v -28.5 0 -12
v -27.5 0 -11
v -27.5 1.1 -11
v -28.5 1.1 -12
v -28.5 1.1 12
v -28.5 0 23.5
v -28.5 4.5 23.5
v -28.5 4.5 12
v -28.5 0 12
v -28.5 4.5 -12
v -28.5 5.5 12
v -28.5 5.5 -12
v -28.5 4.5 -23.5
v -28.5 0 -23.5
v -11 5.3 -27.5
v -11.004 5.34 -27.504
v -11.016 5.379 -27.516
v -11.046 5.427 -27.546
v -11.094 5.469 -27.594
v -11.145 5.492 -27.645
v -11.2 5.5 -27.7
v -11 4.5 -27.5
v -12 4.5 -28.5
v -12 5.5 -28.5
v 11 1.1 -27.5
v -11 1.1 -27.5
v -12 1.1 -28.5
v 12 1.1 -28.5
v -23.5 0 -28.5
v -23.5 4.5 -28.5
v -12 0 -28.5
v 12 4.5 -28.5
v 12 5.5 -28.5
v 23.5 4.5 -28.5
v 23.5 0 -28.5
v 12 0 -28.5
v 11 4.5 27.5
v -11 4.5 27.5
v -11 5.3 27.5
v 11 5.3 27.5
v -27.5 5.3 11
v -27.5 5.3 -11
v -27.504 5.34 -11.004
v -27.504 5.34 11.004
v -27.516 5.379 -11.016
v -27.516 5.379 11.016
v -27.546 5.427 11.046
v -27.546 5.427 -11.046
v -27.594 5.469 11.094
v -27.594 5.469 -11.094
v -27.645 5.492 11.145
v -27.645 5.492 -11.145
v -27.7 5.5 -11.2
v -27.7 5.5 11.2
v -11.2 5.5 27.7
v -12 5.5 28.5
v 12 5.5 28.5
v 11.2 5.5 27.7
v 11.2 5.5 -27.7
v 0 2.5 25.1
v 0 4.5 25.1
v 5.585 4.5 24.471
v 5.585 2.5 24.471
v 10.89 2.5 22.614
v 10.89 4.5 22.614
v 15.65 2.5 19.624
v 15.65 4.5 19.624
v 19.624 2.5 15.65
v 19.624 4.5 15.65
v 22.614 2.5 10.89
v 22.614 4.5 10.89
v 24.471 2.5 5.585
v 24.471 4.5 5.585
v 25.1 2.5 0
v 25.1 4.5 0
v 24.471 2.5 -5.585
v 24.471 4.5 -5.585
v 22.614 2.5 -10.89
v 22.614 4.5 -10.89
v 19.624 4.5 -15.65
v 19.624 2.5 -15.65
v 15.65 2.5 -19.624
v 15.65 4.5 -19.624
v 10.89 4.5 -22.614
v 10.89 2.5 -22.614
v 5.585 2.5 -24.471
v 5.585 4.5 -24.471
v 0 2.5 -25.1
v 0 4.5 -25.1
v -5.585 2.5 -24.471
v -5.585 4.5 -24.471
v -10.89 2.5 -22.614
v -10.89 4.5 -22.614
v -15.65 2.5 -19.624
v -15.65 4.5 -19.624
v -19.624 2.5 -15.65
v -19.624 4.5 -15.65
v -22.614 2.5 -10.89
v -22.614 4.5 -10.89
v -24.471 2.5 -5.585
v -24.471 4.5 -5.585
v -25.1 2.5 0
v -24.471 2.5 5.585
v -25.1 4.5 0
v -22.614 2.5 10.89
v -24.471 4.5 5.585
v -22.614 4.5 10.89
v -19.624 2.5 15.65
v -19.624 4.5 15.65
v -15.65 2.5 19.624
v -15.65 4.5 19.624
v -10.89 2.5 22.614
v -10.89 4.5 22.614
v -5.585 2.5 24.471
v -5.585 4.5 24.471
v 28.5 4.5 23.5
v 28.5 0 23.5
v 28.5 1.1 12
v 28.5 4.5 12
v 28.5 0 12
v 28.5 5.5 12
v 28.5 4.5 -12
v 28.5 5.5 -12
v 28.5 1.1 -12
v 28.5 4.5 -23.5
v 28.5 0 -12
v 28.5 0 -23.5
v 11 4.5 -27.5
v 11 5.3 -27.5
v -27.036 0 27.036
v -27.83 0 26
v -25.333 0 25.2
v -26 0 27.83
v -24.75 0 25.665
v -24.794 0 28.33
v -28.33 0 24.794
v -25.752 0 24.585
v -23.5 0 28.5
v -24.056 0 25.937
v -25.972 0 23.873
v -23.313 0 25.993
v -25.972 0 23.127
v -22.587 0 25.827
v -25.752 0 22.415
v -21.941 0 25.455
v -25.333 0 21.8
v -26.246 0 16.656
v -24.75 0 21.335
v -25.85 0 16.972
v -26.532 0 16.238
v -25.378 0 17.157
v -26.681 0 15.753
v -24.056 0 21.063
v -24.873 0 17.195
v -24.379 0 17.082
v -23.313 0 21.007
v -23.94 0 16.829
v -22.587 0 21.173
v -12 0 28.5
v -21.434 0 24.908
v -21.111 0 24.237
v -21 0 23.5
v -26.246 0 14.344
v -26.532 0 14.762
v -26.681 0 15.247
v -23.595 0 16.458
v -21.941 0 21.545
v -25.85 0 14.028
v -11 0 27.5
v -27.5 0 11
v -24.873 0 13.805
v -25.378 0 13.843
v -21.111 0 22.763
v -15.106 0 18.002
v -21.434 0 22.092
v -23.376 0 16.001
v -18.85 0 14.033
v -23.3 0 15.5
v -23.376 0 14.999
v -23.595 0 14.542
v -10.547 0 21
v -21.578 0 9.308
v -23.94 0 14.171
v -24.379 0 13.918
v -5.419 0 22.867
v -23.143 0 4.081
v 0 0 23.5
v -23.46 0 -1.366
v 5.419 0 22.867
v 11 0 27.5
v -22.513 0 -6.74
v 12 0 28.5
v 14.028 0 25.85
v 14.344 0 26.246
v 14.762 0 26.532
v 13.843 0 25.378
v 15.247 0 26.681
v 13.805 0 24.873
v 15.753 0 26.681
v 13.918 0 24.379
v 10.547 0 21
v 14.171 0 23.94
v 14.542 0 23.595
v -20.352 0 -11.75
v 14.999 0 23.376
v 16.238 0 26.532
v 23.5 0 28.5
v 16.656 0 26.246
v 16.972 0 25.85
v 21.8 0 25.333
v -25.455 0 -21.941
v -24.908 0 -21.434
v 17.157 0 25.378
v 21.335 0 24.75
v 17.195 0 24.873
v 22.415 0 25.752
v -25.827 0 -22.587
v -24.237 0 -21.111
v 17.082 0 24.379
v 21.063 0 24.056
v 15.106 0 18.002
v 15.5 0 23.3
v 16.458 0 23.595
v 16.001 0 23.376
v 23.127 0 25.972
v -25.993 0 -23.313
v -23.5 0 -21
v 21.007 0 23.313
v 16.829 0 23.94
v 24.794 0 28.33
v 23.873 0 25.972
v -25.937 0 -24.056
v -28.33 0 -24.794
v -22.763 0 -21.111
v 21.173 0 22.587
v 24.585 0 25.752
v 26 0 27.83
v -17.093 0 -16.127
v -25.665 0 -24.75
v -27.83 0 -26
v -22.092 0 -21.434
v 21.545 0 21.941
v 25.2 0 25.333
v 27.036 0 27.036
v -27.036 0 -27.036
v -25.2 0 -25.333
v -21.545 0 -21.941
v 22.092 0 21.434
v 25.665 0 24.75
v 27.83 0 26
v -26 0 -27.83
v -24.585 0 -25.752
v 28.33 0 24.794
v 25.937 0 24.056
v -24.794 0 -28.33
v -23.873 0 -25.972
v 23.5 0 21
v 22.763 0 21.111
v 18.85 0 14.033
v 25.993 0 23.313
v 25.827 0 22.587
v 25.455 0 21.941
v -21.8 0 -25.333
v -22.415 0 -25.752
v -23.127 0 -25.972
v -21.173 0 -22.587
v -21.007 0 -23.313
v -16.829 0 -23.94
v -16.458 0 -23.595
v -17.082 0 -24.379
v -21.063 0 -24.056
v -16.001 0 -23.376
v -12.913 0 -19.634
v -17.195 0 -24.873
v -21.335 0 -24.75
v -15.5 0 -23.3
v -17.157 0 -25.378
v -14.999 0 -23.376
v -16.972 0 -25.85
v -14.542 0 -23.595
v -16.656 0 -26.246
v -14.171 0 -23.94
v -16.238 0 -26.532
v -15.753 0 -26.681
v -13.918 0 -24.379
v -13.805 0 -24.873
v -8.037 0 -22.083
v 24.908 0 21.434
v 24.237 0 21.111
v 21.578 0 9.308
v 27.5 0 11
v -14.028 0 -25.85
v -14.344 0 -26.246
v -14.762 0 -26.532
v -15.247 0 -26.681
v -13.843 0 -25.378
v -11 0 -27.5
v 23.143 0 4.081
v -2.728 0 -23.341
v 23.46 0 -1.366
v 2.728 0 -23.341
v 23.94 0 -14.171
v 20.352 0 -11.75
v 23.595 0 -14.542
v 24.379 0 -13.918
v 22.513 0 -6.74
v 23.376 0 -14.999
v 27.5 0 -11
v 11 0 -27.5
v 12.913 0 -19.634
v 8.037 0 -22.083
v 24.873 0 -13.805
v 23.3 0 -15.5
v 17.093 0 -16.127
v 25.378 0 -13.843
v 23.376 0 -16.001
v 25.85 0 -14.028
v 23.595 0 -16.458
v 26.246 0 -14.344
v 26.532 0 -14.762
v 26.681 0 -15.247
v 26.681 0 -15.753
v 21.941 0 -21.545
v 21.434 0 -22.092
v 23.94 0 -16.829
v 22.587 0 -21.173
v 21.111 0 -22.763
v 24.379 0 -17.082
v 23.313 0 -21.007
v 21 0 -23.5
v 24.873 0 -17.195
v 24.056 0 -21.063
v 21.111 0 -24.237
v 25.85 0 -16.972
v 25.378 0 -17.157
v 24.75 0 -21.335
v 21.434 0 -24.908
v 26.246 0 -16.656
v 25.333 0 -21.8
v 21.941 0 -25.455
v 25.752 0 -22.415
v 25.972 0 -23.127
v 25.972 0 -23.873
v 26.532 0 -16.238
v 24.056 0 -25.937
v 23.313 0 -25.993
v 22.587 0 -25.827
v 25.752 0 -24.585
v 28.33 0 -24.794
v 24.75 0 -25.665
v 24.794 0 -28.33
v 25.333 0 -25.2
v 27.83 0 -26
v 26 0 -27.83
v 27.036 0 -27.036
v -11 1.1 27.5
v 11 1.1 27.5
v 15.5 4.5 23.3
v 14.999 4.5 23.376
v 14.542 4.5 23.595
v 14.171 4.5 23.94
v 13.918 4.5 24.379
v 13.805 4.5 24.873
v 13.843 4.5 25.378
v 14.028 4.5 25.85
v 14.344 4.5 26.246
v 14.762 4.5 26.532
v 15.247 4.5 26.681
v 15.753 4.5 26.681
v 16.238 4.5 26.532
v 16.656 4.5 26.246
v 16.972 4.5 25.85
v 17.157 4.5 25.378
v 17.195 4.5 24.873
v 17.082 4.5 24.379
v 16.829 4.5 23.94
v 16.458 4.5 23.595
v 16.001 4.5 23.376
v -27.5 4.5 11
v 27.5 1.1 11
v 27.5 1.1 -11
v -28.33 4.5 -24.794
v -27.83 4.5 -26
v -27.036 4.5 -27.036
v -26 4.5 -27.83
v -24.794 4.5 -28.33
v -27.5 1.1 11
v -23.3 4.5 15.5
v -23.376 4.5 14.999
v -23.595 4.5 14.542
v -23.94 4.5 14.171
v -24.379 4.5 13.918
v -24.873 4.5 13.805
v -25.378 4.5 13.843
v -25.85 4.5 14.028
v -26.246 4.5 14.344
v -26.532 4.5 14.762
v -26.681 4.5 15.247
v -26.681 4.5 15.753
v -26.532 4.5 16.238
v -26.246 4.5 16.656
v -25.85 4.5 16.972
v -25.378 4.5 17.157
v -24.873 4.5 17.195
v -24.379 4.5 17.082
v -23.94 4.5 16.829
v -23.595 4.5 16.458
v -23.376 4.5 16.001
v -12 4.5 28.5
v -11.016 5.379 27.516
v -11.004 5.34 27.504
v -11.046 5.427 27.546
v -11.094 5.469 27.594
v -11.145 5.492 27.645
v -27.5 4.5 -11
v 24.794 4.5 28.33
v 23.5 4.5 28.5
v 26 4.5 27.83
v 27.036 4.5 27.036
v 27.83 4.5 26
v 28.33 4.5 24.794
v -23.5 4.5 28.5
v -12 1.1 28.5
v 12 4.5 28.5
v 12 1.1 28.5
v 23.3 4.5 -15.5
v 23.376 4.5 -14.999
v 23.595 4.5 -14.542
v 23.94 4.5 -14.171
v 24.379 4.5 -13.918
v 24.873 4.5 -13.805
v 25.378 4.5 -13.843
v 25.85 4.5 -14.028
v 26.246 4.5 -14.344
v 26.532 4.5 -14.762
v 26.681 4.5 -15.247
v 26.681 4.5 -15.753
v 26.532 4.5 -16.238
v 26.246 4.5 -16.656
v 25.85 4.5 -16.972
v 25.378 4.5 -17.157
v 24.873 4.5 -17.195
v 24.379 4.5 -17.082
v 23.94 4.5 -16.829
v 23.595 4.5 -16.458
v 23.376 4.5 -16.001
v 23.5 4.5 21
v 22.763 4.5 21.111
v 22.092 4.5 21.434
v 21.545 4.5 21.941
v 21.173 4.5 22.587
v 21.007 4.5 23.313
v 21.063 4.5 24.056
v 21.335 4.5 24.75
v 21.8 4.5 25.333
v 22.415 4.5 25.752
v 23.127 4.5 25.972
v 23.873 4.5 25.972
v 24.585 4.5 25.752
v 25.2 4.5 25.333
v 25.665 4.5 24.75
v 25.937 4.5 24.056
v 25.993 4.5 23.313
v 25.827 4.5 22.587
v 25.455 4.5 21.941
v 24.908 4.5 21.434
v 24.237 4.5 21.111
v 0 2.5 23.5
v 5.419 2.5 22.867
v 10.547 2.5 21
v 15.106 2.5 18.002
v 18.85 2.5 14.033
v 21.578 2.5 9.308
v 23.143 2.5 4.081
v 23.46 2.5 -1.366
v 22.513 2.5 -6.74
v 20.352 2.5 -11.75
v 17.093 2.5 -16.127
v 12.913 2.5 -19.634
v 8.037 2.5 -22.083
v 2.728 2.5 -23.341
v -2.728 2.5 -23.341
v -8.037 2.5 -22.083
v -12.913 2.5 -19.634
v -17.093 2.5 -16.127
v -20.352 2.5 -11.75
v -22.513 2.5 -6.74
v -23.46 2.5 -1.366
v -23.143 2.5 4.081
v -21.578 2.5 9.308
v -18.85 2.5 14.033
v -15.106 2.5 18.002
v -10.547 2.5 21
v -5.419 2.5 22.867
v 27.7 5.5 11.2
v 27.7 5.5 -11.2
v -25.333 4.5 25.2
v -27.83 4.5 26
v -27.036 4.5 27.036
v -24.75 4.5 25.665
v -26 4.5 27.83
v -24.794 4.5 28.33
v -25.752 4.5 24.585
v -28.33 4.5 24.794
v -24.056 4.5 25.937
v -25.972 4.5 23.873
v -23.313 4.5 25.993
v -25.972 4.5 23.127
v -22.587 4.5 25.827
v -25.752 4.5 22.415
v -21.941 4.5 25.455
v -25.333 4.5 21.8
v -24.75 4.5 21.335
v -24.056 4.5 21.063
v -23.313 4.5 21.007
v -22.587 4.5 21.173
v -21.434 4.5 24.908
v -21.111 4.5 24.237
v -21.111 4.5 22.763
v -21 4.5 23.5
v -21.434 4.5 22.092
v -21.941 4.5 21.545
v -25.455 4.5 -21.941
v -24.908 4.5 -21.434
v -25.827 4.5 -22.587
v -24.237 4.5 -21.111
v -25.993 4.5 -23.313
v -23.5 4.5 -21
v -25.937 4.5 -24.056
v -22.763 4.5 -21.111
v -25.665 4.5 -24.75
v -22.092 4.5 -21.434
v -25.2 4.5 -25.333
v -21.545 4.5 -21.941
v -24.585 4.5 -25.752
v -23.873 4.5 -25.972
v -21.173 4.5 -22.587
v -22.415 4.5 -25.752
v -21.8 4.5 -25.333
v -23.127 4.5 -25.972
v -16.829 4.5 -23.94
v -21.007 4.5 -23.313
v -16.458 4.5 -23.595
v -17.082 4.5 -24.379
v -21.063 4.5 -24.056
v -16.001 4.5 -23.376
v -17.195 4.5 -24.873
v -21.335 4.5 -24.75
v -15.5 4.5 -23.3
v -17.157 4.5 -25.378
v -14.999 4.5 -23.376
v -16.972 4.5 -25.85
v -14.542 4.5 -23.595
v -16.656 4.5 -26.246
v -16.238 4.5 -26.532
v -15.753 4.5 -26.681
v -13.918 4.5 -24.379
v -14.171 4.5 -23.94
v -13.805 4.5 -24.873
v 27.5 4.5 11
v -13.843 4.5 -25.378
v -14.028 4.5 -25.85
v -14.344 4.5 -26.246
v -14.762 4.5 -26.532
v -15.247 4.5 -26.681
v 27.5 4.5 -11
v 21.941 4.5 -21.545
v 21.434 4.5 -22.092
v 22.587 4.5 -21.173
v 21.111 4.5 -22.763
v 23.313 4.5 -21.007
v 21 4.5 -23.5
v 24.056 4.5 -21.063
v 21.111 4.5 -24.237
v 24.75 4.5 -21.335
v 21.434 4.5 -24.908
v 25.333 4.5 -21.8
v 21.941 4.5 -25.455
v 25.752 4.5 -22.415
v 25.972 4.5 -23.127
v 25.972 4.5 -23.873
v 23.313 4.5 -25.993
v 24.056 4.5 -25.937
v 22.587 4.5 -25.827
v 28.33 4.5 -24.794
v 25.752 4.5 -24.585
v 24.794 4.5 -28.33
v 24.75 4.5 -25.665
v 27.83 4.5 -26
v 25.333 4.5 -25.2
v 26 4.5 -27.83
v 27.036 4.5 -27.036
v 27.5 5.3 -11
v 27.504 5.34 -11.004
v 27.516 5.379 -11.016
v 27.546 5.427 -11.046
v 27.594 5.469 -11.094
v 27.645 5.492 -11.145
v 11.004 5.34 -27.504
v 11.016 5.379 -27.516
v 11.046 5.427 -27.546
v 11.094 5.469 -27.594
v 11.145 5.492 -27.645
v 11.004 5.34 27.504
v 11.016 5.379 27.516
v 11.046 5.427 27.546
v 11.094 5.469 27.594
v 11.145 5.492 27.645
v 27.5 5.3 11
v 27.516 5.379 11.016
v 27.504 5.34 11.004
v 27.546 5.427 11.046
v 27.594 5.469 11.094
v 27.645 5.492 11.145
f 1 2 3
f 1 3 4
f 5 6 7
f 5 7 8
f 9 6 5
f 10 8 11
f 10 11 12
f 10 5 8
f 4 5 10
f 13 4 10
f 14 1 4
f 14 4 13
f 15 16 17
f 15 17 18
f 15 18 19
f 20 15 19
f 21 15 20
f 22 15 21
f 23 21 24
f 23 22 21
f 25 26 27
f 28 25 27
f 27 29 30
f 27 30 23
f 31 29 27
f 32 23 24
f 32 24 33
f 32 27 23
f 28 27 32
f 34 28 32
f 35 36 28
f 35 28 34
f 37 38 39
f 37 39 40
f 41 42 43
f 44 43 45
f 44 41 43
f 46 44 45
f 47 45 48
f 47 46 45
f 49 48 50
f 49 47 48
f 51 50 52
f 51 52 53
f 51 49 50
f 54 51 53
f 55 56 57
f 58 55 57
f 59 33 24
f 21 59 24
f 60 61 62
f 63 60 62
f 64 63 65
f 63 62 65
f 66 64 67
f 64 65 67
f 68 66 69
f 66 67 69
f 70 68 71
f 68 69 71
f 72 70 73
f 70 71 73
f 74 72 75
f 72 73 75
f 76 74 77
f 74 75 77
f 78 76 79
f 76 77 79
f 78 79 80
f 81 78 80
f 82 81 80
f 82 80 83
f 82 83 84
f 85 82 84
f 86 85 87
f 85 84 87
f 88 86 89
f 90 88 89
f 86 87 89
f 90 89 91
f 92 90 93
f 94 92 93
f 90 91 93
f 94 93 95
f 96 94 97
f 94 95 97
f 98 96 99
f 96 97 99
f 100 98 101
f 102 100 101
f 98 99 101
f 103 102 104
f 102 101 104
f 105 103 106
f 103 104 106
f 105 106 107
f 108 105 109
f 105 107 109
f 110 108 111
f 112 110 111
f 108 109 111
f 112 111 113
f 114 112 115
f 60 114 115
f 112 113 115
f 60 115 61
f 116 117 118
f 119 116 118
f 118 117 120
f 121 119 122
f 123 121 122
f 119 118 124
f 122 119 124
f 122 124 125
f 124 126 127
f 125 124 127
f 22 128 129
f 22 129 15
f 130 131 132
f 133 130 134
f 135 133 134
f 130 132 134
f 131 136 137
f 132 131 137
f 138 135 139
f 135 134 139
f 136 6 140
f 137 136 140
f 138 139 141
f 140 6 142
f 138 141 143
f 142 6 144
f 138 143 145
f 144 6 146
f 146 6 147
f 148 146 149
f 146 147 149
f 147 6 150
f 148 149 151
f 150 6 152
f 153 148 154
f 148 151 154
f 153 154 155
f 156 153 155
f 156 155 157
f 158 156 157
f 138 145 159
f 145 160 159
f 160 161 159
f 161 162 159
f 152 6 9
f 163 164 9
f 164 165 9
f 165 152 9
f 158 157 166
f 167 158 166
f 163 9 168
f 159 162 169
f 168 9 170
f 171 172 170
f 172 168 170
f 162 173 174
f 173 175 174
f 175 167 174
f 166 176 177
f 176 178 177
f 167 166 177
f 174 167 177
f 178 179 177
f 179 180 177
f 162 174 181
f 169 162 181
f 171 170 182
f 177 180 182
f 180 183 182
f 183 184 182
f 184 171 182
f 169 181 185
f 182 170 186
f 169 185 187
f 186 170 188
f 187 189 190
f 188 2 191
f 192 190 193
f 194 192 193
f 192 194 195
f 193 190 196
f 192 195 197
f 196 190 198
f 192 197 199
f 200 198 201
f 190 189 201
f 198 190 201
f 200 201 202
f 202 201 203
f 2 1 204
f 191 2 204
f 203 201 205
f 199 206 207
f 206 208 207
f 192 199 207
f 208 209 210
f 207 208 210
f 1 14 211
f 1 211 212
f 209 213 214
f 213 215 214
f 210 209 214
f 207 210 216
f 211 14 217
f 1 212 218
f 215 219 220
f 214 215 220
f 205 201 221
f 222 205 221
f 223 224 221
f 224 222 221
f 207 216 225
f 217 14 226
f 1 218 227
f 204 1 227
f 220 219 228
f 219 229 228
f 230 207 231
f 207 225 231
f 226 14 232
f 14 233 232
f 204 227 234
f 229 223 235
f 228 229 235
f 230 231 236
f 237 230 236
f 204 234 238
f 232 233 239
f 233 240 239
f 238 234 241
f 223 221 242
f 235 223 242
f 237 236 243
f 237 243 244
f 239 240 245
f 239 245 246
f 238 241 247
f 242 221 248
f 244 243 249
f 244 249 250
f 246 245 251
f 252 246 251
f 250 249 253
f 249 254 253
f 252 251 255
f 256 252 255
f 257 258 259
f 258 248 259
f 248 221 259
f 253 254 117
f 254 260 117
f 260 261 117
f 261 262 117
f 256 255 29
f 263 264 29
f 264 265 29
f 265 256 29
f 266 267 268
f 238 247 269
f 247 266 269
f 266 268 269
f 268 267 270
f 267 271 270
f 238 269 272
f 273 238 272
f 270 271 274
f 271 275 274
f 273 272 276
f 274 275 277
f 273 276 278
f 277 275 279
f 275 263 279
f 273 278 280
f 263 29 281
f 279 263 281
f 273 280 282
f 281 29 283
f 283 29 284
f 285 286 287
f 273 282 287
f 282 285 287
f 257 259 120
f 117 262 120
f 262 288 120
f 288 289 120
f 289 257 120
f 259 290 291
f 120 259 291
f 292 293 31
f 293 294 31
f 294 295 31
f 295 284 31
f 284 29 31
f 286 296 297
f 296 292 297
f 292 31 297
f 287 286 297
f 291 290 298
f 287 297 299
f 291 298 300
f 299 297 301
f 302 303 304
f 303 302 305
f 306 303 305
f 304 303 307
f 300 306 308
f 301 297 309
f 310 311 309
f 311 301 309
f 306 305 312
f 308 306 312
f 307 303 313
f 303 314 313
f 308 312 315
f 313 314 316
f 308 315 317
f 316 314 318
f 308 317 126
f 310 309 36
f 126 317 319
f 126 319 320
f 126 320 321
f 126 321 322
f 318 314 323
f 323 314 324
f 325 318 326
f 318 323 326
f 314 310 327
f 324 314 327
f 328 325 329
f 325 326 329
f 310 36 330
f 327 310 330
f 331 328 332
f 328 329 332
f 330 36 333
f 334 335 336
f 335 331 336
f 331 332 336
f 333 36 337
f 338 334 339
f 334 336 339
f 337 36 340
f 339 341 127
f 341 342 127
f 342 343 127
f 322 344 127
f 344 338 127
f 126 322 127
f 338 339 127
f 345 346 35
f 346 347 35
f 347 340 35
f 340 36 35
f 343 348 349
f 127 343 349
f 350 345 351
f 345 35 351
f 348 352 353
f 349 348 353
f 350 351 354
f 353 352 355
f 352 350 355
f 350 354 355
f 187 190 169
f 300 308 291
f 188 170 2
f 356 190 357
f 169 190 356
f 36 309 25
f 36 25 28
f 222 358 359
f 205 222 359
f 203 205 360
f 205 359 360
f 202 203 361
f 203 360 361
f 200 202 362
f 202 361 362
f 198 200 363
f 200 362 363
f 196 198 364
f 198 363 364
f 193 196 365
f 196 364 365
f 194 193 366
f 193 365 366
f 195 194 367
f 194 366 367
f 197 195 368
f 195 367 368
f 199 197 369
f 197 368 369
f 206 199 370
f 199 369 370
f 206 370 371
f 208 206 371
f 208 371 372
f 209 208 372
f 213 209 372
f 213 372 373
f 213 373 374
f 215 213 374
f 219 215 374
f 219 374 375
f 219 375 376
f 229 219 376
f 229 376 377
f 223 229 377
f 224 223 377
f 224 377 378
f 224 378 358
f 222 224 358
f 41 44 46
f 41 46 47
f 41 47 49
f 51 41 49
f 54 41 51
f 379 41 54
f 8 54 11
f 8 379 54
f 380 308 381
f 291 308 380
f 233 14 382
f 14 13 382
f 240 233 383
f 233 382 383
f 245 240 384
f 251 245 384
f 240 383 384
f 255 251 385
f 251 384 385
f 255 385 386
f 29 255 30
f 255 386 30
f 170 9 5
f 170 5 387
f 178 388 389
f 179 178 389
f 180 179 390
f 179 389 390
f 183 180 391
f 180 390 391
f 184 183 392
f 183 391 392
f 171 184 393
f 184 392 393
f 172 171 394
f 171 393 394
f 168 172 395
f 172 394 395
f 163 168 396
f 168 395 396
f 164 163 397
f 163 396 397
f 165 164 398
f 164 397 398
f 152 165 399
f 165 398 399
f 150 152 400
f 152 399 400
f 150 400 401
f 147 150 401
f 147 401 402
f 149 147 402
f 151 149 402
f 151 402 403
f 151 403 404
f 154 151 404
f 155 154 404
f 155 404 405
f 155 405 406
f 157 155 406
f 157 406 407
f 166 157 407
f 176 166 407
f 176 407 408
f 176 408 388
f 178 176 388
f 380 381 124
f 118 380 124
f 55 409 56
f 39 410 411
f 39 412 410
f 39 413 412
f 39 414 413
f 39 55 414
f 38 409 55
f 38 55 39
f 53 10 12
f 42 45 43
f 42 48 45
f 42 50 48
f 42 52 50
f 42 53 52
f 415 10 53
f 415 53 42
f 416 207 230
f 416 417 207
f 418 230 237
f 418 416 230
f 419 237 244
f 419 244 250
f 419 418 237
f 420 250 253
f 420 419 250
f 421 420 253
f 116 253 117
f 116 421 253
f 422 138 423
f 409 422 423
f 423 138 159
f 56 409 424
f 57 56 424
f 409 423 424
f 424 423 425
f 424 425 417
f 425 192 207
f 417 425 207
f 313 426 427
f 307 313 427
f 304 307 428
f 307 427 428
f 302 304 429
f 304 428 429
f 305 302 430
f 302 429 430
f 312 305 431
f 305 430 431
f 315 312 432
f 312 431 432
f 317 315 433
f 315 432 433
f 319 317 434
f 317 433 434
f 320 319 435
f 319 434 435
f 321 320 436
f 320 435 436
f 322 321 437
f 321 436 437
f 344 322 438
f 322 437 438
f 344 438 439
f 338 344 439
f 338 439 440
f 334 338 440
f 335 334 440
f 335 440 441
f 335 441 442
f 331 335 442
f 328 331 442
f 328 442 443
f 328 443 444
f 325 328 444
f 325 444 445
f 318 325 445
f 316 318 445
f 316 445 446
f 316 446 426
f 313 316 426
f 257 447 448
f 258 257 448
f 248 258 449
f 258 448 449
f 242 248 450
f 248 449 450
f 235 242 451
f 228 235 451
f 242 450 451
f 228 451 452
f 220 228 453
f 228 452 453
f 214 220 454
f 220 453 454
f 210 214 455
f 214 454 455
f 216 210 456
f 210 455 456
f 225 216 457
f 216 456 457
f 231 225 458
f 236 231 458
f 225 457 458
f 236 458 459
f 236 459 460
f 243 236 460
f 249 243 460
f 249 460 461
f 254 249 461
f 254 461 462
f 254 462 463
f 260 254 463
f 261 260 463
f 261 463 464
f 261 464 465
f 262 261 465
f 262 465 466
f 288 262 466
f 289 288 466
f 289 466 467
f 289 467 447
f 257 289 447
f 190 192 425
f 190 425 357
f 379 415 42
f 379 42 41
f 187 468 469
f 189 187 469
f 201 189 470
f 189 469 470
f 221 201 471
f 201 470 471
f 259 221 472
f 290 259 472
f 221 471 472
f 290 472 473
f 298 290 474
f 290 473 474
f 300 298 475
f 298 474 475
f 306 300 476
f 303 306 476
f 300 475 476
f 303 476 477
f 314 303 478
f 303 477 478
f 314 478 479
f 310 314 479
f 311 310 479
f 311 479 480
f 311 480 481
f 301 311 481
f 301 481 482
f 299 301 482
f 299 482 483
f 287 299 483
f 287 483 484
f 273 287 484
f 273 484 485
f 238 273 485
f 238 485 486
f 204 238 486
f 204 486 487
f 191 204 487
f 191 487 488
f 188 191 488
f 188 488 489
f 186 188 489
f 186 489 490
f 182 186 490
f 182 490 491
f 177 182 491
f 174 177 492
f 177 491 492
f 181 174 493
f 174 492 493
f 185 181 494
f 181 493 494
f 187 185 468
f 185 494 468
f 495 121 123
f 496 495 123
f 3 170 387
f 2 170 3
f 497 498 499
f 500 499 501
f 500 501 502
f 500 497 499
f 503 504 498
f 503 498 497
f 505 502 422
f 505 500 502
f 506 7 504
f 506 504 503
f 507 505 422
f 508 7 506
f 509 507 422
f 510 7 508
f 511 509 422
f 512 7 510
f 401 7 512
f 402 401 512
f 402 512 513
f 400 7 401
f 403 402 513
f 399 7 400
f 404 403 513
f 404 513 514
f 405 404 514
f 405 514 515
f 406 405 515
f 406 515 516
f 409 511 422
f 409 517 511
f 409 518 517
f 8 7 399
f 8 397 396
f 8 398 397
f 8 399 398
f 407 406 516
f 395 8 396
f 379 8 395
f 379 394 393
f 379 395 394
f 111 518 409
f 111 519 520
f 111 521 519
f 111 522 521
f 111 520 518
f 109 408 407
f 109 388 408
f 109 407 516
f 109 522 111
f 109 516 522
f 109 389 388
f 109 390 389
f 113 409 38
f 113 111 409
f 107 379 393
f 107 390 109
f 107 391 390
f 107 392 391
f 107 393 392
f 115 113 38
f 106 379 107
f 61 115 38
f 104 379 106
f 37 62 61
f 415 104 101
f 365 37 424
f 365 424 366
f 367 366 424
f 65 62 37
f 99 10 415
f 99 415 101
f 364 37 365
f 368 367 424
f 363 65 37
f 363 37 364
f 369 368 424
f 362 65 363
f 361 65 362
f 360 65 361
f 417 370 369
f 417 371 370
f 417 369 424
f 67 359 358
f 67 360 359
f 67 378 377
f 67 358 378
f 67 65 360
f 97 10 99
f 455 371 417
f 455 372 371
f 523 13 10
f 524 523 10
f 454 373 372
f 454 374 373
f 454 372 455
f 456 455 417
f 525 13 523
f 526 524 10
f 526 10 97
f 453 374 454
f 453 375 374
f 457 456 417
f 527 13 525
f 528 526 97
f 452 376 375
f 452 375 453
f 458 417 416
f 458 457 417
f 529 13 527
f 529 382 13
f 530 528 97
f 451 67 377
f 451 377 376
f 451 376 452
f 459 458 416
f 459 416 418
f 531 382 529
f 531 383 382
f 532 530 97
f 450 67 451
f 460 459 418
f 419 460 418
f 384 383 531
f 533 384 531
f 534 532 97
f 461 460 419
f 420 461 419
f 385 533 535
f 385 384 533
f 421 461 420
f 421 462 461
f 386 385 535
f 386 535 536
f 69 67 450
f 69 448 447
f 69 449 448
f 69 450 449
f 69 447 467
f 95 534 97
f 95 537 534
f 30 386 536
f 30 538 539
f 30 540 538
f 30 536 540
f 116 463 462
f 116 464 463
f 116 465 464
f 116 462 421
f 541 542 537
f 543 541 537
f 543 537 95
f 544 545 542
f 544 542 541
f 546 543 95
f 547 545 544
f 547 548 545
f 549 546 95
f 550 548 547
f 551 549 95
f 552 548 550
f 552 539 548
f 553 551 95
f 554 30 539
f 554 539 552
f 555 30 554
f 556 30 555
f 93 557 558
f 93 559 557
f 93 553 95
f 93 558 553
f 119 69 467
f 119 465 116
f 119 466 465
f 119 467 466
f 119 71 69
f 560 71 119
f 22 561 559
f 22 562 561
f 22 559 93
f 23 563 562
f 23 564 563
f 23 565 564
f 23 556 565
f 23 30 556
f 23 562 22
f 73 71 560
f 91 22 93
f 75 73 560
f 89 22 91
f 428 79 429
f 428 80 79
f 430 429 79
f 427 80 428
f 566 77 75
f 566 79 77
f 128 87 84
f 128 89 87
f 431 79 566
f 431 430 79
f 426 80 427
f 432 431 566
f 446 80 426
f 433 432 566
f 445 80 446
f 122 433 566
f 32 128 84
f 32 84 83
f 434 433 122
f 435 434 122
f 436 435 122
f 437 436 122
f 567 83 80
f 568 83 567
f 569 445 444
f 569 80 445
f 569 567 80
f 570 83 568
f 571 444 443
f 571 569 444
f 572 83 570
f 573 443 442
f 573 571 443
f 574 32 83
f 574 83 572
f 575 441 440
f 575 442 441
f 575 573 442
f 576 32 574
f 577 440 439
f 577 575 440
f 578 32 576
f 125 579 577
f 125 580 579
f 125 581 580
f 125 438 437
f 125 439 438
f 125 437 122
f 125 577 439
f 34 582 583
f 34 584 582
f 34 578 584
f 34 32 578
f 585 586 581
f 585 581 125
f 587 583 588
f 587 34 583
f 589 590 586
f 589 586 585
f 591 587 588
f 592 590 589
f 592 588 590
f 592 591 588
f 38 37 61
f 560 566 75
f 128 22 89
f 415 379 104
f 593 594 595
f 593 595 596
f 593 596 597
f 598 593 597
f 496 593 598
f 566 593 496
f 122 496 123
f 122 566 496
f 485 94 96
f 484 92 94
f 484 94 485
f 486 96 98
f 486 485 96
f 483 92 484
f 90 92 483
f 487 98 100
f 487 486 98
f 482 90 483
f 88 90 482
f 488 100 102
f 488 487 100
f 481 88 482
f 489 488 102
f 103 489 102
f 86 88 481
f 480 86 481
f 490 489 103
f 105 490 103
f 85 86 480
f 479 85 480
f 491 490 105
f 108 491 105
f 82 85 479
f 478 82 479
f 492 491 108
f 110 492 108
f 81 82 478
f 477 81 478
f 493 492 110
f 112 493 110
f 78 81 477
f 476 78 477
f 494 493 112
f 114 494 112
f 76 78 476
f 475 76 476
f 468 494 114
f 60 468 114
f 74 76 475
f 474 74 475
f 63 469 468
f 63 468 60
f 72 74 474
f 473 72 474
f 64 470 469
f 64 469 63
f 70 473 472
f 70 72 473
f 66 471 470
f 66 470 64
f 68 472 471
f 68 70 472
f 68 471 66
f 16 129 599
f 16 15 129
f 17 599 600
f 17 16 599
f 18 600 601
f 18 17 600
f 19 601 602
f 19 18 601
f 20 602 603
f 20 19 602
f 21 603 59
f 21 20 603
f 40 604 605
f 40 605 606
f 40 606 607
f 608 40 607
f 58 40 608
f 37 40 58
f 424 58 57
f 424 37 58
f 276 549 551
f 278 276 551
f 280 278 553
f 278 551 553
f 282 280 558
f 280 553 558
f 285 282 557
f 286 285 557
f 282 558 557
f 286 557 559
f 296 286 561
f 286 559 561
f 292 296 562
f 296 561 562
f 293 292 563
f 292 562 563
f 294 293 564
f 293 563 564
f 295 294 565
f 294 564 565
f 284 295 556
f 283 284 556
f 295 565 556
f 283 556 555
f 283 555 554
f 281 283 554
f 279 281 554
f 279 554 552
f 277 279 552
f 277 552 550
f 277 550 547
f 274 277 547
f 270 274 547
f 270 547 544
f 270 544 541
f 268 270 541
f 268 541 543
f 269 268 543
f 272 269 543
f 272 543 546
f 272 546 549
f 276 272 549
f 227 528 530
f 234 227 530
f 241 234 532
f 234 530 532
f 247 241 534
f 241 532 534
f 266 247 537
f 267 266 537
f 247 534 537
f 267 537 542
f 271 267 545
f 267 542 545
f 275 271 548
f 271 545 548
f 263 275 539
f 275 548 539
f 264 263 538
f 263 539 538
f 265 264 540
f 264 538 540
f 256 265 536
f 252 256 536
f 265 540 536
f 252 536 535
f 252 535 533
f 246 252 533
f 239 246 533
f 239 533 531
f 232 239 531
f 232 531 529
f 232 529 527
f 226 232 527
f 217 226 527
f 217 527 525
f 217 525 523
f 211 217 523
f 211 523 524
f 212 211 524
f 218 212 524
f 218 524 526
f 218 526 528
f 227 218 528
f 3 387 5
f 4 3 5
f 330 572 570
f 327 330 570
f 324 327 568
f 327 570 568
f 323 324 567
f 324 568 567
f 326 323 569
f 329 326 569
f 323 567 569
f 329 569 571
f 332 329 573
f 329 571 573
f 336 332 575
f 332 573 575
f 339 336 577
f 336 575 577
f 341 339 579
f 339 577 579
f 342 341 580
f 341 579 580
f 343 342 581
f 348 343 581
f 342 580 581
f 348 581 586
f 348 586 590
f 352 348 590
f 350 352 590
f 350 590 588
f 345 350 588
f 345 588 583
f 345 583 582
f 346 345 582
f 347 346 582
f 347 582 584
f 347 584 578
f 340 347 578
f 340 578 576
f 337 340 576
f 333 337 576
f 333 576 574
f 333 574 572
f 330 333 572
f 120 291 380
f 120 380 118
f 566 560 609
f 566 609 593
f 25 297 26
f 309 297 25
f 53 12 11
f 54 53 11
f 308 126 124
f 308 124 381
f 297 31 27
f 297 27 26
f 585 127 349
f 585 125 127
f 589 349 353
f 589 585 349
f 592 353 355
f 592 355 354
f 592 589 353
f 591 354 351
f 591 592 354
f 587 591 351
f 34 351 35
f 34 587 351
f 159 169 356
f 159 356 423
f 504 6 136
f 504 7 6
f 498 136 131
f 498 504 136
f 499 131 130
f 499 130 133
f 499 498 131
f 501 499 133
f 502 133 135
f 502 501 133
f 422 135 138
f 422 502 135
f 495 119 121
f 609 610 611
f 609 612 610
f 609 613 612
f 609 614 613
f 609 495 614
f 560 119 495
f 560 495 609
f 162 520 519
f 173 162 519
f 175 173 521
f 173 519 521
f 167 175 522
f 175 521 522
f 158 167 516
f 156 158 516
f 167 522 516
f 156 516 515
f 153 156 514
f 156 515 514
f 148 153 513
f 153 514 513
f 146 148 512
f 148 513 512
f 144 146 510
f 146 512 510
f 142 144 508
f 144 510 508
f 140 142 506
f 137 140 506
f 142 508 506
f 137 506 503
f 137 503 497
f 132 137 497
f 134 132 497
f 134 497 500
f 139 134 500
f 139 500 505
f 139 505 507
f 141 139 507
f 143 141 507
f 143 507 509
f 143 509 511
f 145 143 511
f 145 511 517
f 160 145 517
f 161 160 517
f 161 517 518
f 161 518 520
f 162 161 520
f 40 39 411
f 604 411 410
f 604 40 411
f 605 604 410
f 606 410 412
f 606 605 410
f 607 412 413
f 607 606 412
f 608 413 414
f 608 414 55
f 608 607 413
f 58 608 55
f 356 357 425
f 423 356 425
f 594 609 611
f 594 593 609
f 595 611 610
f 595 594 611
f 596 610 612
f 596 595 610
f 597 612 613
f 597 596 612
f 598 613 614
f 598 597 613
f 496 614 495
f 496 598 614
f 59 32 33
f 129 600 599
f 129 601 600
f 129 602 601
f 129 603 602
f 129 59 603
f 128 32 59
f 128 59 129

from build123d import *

# Parameters (mm, degrees)
SKETCH1_W                = 57
SKETCH1_H                = 57
BOSS_EXTRUDE1_DEPTH      = 4.5
FILLET1_R                = 5
SKETCH2_R                = 2.5
SKETCH2_R_2              = 1.7
CUT_EXTRUDE1_DEPTH       = 41.555517504
BOSS_EXTRUDE2_DEPTH      = 1
FILLET2_R                = 0.2
SKETCH4_R                = 23.5
CUT_EXTRUDE2_DEPTH       = 41.555517504
SKETCH4_3_R              = 25.1
SKETCH4_3_R_2            = 23.5
CUT_EXTRUDE3_DEPTH       = 2
CUT_EXTRUDE4_DEPTH       = 1.1
CIRPATTERN1_COUNT        = 4
FILLET2_OF_CIRPATTERN1_R = 0.2


with BuildPart() as part:
    # Sketch1 → Boss-Extrude1 (new body)
    with BuildSketch(Plane(origin=(0, 0, 0), x_dir=(1, 0, 0), z_dir=(0, 1, 0))):
        Rectangle(SKETCH1_W, SKETCH1_H)
    extrude(amount=BOSS_EXTRUDE1_DEPTH)

    # Fillet1
    fillet1_edges = [part.edges().sort_by_distance(p)[0] for p in [
        (-28.5, 2.25, -28.5),
        (28.5, 2.25, -28.5),
        (-28.5, 2.25, 28.5),
        (28.5, 2.25, 28.5),
    ]]
    fillet(fillet1_edges, radius=FILLET1_R)

    # Sketch2 → Cut-Extrude1 (cut, through all)
    with BuildSketch(Plane(origin=(0, 4.5, 0), x_dir=(1, 0, 0), z_dir=(0, 1, 0))):
        with Locations((-23.5, 23.5)):
            Circle(SKETCH2_R)
        with Locations((-15.5, 25)):
            Circle(SKETCH2_R_2)
    cut_extrude1 = extrude(amount=-CUT_EXTRUDE1_DEPTH, mode=Mode.SUBTRACT)

    # Sketch3 → Boss-Extrude2 (add)
    with BuildSketch(Plane(origin=(0, 4.5, 0), x_dir=(1, 0, 0), z_dir=(0, 1, 0))):
        Polygon((11, 27.5), (-11, 27.5), (-12, 28.5), (12, 28.5), align=None)
    boss_extrude2 = extrude(amount=BOSS_EXTRUDE2_DEPTH)

    # Fillet2
    fillet2_edges = [part.edges().sort_by_distance(p)[0] for p in [
        (0, 5.5, -27.5),
    ]]
    fillet(fillet2_edges, radius=FILLET2_R)

    # Sketch4 → Cut-Extrude2 (cut, through all)
    with BuildSketch(Plane(origin=(0, 4.5, 0), x_dir=(1, 0, 0), z_dir=(0, 1, 0))):
        Circle(SKETCH4_R)
    extrude(amount=-CUT_EXTRUDE2_DEPTH, mode=Mode.SUBTRACT)

    # Sketch4<3> → Cut-Extrude3 (cut)
    with BuildSketch(Plane(origin=(0, 4.5, 0), x_dir=(1, 0, 0), z_dir=(0, 1, 0))):
        Circle(SKETCH4_3_R)
        Circle(SKETCH4_3_R_2, mode=Mode.SUBTRACT)
    extrude(amount=-CUT_EXTRUDE3_DEPTH, mode=Mode.SUBTRACT)

    # Sketch5 → Cut-Extrude4 (cut)
    with BuildSketch(Plane.XZ):
        Polygon((-11, -27.5), (11, -27.5), (12, -28.5), (-12, -28.5), align=None)
    cut_extrude4 = extrude(amount=-CUT_EXTRUDE4_DEPTH, mode=Mode.SUBTRACT)

    # CirPattern1: Cut-Extrude1, Boss-Extrude2, Cut-Extrude4 ×4 about axis
    cirpattern1_axis = Axis((0, 2.5, 0), (0, 1, 0))
    add([cut_extrude1.rotate(cirpattern1_axis, i * 360 / CIRPATTERN1_COUNT) for i in range(1, CIRPATTERN1_COUNT)], mode=Mode.SUBTRACT)
    add([boss_extrude2.rotate(cirpattern1_axis, i * 360 / CIRPATTERN1_COUNT) for i in range(1, CIRPATTERN1_COUNT)])
    add([cut_extrude4.rotate(cirpattern1_axis, i * 360 / CIRPATTERN1_COUNT) for i in range(1, CIRPATTERN1_COUNT)], mode=Mode.SUBTRACT)

    # Fillet2 of CirPattern1
    fillet2_of_cirpattern1_edges = [part.edges().sort_by_distance(p)[0] for p in [
        (-27.5, 5.5, 0),
        (0, 5.5, 27.5),
        (27.5, 5.5, 0),
    ]]
    fillet(fillet2_of_cirpattern1_edges, radius=FILLET2_OF_CIRPATTERN1_R)


solid = part.part
